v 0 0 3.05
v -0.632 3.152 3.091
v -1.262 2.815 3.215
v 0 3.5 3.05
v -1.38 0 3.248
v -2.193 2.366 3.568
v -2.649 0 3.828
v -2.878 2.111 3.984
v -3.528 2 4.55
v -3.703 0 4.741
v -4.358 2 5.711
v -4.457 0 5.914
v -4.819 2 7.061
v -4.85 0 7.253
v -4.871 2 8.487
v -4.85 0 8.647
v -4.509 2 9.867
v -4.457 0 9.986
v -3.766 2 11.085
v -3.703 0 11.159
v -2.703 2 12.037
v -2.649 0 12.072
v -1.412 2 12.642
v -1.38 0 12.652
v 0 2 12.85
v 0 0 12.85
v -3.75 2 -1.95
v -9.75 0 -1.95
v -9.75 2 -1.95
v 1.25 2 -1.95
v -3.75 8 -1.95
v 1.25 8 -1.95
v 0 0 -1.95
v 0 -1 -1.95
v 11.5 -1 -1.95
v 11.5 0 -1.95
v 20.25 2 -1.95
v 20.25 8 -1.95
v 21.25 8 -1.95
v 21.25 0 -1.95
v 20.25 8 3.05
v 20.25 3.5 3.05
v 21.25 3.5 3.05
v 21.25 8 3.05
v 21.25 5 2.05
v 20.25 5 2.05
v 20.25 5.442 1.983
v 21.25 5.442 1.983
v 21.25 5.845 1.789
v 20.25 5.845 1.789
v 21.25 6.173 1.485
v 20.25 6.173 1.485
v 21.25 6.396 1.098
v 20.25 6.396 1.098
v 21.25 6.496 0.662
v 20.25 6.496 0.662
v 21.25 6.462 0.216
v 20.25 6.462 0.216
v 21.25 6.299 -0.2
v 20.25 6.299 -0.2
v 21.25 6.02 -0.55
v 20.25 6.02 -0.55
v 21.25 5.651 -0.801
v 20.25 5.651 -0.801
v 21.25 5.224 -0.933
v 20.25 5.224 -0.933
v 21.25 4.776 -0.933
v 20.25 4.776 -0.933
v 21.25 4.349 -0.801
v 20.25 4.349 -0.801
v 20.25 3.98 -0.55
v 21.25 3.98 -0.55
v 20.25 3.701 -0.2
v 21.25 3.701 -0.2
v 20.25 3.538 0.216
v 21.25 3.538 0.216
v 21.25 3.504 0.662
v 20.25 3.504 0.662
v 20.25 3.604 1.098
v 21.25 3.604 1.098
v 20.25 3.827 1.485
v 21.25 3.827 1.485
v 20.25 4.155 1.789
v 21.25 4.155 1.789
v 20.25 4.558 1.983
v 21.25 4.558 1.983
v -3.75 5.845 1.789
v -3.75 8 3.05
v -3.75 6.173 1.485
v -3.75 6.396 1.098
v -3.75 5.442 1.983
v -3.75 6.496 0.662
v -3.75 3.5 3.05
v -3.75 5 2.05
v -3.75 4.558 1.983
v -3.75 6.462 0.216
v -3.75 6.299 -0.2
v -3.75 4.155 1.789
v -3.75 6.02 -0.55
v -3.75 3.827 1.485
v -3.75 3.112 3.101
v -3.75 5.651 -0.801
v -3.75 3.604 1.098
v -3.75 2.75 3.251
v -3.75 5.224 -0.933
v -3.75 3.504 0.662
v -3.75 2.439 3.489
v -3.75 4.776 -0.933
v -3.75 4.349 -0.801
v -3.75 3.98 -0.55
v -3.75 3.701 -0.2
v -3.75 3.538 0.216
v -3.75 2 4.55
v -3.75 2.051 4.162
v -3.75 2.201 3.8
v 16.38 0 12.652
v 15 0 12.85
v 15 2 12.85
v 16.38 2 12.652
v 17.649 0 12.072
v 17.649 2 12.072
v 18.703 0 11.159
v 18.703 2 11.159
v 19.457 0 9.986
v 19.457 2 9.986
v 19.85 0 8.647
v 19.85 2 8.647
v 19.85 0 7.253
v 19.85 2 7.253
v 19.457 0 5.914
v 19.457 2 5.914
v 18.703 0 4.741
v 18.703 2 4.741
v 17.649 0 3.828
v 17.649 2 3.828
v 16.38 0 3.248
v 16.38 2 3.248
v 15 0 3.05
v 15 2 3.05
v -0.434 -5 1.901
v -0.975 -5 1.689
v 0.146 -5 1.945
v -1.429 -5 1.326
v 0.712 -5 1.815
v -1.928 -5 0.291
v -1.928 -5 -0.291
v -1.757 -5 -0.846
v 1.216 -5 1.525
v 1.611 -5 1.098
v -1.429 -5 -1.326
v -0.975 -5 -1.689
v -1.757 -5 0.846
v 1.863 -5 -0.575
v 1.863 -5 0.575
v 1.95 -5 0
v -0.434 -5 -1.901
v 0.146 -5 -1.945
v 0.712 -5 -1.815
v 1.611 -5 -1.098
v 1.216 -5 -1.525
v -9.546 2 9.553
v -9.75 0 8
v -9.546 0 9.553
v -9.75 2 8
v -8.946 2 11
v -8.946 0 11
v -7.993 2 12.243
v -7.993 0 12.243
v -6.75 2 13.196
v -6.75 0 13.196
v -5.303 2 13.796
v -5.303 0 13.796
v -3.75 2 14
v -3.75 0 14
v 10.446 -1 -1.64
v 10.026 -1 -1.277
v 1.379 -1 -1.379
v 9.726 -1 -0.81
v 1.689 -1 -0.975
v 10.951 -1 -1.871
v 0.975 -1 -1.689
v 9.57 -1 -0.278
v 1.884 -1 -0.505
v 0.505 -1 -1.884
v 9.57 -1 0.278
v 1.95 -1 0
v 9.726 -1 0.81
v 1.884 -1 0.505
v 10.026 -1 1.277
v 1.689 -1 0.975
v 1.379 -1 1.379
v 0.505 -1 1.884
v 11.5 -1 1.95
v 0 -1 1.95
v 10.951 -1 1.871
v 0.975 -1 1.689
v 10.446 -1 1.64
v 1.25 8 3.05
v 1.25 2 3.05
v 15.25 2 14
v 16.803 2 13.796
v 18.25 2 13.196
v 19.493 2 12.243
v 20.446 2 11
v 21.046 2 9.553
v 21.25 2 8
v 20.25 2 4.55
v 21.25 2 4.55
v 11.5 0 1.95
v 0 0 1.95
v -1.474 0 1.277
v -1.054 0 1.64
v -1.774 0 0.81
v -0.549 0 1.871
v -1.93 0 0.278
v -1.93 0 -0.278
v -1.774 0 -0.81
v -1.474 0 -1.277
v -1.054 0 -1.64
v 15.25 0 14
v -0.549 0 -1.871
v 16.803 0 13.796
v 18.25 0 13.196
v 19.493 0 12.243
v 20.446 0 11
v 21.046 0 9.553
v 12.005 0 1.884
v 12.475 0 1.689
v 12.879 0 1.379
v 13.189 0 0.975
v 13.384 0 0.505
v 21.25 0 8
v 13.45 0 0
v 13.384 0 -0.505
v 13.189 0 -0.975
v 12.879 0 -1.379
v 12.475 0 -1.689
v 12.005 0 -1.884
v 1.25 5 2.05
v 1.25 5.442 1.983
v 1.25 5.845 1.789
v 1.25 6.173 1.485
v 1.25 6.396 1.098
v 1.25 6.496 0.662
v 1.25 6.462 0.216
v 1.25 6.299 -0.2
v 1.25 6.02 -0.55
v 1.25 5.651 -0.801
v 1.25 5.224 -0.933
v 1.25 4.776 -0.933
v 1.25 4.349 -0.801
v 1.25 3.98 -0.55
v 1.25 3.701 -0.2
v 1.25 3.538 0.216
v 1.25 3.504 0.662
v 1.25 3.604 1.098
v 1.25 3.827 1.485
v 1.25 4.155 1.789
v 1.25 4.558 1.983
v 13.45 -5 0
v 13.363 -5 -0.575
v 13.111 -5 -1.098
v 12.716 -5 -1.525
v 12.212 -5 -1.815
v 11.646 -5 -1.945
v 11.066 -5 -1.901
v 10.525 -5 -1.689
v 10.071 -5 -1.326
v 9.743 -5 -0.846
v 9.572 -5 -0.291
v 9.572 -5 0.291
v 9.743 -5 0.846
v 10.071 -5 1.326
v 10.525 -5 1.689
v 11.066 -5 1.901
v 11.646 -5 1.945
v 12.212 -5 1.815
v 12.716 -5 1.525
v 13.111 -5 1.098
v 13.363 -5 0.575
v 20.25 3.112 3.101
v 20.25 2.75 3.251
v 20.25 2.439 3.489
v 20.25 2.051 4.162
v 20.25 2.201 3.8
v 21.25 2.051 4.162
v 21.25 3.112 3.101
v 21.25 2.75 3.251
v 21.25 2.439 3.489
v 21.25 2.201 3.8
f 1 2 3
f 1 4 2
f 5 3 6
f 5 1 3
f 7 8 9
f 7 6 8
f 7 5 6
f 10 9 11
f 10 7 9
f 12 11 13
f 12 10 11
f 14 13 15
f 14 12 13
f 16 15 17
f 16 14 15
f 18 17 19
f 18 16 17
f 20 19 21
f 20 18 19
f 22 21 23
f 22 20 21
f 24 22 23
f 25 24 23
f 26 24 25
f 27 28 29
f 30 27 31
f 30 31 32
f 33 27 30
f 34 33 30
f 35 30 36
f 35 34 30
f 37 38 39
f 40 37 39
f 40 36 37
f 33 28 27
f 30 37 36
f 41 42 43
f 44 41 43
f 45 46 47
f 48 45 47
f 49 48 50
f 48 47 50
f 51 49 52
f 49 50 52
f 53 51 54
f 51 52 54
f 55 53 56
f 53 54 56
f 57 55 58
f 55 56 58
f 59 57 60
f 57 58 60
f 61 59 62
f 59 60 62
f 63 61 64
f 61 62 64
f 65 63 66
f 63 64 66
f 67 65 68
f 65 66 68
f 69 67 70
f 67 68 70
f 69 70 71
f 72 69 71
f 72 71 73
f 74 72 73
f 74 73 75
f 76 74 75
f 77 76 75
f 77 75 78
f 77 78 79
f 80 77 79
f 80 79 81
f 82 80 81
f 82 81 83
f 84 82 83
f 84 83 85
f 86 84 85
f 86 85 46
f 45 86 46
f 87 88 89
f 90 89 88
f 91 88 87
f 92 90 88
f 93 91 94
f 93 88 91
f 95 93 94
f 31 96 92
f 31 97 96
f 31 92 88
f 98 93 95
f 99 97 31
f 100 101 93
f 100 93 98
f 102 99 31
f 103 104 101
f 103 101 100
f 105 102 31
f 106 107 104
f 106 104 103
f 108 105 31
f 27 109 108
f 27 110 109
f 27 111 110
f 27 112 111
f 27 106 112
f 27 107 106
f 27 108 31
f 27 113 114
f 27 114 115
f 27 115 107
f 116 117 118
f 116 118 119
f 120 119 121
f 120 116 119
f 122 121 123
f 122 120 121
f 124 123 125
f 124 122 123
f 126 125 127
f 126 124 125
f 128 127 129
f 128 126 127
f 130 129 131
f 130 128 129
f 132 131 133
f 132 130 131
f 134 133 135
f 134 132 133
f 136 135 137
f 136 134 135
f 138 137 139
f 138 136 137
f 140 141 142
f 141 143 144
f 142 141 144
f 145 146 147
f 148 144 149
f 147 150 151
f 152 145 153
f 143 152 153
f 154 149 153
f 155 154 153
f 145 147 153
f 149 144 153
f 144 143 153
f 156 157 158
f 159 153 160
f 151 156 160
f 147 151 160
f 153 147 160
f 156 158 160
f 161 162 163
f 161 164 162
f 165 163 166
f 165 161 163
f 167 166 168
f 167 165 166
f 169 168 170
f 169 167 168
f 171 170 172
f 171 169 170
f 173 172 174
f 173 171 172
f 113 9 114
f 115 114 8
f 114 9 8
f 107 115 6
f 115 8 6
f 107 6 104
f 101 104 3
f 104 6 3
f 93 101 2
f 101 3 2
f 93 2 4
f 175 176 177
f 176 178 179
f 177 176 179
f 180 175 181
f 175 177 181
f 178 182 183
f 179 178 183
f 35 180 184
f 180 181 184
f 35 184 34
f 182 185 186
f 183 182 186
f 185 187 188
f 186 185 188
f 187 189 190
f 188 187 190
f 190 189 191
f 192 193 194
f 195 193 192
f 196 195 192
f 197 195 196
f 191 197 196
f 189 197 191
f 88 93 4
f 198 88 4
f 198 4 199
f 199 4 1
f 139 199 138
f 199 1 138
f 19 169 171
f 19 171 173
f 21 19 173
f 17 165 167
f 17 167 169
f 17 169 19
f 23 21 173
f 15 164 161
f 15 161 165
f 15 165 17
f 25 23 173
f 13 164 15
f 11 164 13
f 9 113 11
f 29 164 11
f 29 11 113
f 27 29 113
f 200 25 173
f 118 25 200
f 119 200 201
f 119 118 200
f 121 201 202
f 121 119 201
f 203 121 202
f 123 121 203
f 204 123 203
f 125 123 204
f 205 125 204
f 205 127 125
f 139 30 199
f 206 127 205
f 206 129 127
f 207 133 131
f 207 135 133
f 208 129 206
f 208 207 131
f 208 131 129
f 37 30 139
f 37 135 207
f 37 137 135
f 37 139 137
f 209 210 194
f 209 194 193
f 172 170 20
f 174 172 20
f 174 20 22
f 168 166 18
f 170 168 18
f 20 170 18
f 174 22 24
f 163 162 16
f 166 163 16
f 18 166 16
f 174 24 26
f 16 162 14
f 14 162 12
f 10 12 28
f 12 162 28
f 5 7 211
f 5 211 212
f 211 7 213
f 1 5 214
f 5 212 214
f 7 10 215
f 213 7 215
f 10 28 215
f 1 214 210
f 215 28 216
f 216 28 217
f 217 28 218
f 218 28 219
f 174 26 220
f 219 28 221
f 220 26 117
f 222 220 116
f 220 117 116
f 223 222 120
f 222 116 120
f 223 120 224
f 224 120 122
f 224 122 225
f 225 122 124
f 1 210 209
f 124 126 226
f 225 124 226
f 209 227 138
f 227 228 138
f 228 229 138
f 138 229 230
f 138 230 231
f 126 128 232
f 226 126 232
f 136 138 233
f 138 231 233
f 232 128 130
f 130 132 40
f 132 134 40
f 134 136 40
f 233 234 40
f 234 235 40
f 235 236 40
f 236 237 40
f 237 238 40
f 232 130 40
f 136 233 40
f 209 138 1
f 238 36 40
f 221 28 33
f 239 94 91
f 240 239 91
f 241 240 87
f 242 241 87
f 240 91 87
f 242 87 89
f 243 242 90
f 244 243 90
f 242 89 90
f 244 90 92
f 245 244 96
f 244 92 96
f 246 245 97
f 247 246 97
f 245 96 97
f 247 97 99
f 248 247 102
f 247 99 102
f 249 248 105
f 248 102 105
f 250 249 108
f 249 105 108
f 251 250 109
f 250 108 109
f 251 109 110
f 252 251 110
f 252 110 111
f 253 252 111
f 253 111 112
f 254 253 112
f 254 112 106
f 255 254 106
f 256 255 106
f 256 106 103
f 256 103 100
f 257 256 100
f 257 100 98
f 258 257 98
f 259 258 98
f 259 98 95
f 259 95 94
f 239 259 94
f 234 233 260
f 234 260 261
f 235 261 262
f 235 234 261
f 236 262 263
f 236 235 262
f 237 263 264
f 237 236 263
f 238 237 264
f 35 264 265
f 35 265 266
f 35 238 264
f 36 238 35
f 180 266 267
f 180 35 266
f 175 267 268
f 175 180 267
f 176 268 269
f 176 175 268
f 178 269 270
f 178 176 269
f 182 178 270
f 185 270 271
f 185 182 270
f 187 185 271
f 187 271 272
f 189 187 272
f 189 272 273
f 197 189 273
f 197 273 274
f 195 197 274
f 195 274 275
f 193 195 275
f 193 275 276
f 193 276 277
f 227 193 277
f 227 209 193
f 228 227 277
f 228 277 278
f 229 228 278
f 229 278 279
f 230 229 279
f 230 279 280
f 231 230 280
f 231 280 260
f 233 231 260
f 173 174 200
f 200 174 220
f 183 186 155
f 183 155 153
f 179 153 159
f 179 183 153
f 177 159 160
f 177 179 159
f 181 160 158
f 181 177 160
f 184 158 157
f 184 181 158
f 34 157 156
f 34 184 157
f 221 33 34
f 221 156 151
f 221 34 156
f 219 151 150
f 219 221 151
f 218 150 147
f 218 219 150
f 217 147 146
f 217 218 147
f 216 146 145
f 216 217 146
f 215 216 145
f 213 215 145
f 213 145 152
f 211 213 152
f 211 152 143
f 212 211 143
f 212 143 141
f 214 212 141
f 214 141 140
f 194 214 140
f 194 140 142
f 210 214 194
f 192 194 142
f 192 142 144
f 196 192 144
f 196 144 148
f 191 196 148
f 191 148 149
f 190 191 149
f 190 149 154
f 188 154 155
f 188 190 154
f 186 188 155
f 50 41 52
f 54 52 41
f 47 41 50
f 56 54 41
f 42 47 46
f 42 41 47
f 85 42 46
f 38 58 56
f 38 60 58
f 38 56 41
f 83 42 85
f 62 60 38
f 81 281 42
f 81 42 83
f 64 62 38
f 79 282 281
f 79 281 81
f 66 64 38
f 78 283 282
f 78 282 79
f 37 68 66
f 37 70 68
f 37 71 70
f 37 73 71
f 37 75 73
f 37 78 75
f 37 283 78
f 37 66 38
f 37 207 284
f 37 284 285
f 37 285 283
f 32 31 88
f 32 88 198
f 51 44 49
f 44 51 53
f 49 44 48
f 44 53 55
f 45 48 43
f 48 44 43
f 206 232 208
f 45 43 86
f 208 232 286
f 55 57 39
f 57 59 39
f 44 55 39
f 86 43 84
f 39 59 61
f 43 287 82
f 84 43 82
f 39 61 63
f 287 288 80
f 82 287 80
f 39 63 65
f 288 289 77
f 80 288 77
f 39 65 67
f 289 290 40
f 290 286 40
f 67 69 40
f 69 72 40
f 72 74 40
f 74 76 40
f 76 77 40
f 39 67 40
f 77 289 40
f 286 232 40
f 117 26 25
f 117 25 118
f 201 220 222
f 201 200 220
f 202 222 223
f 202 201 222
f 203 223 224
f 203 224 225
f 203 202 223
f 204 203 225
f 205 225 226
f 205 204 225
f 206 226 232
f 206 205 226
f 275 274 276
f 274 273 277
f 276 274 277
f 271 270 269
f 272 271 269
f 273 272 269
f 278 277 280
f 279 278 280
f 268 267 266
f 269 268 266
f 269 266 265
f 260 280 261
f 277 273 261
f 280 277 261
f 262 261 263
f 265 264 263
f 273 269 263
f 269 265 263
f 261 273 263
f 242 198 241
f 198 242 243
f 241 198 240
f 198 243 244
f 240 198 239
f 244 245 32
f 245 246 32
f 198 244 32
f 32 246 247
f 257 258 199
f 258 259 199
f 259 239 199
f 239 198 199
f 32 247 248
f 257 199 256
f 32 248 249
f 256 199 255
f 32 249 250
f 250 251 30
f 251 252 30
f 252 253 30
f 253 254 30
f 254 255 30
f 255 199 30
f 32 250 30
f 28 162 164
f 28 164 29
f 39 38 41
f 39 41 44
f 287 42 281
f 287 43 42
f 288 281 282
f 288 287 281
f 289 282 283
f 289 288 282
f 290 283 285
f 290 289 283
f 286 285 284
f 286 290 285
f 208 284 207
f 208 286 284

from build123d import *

# Parameters (mm, degrees)
SKETCH1_R             = 1.95
BOSS_EXTRUDE2_DEPTH   = 5
BOSS_EXTRUDE2_2_DEPTH = 5
SKETCH2_W             = 31
SKETCH2_H             = 15.95
BOSS_EXTRUDE4_DEPTH   = 2
CUT_EXTRUDE1_DEPTH    = 2
FILLET1_R             = 6
BOSS_EXTRUDE5_DEPTH   = 1
SKETCH6_W             = 1
SKETCH6_H             = 5
SKETCH6_W_2           = 5
BOSS_EXTRUDE6_DEPTH   = 6
SKETCH8_R             = 1.5
CUT_EXTRUDE3_DEPTH    = 26
FILLET5_R             = 1.5


with BuildPart() as part:
    # Sketch1 → Boss-Extrude2 (new body)
    with BuildSketch(Plane(origin=(0, 0, 0), x_dir=(1, 0, 0), z_dir=(0, 1, 0))):
        Circle(SKETCH1_R)
    extrude(amount=-BOSS_EXTRUDE2_DEPTH)



with BuildPart() as body_2:
    # Sketch1 → Boss-Extrude2 2 (new body)
    with BuildSketch(Plane(origin=(0, 0, 0), x_dir=(1, 0, 0), z_dir=(0, 1, 0))):
        with Locations((11.5, 0)):
            Circle(SKETCH1_R)
    extrude(amount=-BOSS_EXTRUDE2_2_DEPTH)


with BuildPart() as part_1:
    add(part.part)

    add(body_2.part)  # Boss-Extrude4 merges body 2
    # Sketch2 → Boss-Extrude4 (add)
    with BuildSketch(Plane(origin=(0, 0, 0), x_dir=(1, 0, 0), z_dir=(0, 1, 0))):
        with Locations((5.75, -6.025)):
            Rectangle(SKETCH2_W, SKETCH2_H)
    extrude(amount=BOSS_EXTRUDE4_DEPTH)

    # Sketch3 → Cut-Extrude1 (cut)
    with BuildSketch(Plane.XZ):
        with BuildLine():
            Line((0, 12.85), (15, 12.85))
            ThreePointArc((15, 12.85), (19.9, 7.95), (15, 3.05))
            Line((15, 3.05), (0, 3.05))
            ThreePointArc((0, 3.05), (-4.9, 7.95), (0, 12.85))
        make_face()
    extrude(amount=-CUT_EXTRUDE1_DEPTH, mode=Mode.SUBTRACT)

    # Fillet1
    fillet1_edges = [part_1.edges().sort_by_distance(p)[0] for p in [
        (-9.75, 1, 14),
        (21.25, 1, 14),
    ]]
    fillet(fillet1_edges, radius=FILLET1_R)

    # Sketch4 → Boss-Extrude5 (add)
    with BuildSketch(Plane.XZ):
        with BuildLine():
            Line((0, 1.95), (11.5, 1.95))
            ThreePointArc((11.5, 1.95), (13.45, 0), (11.5, -1.95))
            Line((11.5, -1.95), (0, -1.95))
            ThreePointArc((0, -1.95), (-1.95, 0), (0, 1.95))
        make_face()
    extrude(amount=BOSS_EXTRUDE5_DEPTH)

    # Sketch6 → Boss-Extrude6 (add)
    with BuildSketch(Plane(origin=(0, 2, 0), x_dir=(1, 0, 0), z_dir=(0, 1, 0))):
        with Locations((20.75, -0.55)):
            Rectangle(SKETCH6_W, SKETCH6_H)
        with Locations((-1.25, -0.55)):
            Rectangle(SKETCH6_W_2, SKETCH6_H)
    extrude(amount=BOSS_EXTRUDE6_DEPTH)

    # Sketch8 → Cut-Extrude3 (cut, through all)
    with BuildSketch(Plane.ZY.offset(3.75)):
        with Locations((0.55, 5)):
            Circle(SKETCH8_R)
    extrude(amount=-CUT_EXTRUDE3_DEPTH, mode=Mode.SUBTRACT)

    # Fillet5
    fillet5_edges = [part_1.edges().sort_by_distance(p)[0] for p in [
        (-1.875, 2, 3.05),
        (20.75, 2, 3.05),
    ]]
    fillet(fillet5_edges, radius=FILLET5_R)


solid = part_1.part
